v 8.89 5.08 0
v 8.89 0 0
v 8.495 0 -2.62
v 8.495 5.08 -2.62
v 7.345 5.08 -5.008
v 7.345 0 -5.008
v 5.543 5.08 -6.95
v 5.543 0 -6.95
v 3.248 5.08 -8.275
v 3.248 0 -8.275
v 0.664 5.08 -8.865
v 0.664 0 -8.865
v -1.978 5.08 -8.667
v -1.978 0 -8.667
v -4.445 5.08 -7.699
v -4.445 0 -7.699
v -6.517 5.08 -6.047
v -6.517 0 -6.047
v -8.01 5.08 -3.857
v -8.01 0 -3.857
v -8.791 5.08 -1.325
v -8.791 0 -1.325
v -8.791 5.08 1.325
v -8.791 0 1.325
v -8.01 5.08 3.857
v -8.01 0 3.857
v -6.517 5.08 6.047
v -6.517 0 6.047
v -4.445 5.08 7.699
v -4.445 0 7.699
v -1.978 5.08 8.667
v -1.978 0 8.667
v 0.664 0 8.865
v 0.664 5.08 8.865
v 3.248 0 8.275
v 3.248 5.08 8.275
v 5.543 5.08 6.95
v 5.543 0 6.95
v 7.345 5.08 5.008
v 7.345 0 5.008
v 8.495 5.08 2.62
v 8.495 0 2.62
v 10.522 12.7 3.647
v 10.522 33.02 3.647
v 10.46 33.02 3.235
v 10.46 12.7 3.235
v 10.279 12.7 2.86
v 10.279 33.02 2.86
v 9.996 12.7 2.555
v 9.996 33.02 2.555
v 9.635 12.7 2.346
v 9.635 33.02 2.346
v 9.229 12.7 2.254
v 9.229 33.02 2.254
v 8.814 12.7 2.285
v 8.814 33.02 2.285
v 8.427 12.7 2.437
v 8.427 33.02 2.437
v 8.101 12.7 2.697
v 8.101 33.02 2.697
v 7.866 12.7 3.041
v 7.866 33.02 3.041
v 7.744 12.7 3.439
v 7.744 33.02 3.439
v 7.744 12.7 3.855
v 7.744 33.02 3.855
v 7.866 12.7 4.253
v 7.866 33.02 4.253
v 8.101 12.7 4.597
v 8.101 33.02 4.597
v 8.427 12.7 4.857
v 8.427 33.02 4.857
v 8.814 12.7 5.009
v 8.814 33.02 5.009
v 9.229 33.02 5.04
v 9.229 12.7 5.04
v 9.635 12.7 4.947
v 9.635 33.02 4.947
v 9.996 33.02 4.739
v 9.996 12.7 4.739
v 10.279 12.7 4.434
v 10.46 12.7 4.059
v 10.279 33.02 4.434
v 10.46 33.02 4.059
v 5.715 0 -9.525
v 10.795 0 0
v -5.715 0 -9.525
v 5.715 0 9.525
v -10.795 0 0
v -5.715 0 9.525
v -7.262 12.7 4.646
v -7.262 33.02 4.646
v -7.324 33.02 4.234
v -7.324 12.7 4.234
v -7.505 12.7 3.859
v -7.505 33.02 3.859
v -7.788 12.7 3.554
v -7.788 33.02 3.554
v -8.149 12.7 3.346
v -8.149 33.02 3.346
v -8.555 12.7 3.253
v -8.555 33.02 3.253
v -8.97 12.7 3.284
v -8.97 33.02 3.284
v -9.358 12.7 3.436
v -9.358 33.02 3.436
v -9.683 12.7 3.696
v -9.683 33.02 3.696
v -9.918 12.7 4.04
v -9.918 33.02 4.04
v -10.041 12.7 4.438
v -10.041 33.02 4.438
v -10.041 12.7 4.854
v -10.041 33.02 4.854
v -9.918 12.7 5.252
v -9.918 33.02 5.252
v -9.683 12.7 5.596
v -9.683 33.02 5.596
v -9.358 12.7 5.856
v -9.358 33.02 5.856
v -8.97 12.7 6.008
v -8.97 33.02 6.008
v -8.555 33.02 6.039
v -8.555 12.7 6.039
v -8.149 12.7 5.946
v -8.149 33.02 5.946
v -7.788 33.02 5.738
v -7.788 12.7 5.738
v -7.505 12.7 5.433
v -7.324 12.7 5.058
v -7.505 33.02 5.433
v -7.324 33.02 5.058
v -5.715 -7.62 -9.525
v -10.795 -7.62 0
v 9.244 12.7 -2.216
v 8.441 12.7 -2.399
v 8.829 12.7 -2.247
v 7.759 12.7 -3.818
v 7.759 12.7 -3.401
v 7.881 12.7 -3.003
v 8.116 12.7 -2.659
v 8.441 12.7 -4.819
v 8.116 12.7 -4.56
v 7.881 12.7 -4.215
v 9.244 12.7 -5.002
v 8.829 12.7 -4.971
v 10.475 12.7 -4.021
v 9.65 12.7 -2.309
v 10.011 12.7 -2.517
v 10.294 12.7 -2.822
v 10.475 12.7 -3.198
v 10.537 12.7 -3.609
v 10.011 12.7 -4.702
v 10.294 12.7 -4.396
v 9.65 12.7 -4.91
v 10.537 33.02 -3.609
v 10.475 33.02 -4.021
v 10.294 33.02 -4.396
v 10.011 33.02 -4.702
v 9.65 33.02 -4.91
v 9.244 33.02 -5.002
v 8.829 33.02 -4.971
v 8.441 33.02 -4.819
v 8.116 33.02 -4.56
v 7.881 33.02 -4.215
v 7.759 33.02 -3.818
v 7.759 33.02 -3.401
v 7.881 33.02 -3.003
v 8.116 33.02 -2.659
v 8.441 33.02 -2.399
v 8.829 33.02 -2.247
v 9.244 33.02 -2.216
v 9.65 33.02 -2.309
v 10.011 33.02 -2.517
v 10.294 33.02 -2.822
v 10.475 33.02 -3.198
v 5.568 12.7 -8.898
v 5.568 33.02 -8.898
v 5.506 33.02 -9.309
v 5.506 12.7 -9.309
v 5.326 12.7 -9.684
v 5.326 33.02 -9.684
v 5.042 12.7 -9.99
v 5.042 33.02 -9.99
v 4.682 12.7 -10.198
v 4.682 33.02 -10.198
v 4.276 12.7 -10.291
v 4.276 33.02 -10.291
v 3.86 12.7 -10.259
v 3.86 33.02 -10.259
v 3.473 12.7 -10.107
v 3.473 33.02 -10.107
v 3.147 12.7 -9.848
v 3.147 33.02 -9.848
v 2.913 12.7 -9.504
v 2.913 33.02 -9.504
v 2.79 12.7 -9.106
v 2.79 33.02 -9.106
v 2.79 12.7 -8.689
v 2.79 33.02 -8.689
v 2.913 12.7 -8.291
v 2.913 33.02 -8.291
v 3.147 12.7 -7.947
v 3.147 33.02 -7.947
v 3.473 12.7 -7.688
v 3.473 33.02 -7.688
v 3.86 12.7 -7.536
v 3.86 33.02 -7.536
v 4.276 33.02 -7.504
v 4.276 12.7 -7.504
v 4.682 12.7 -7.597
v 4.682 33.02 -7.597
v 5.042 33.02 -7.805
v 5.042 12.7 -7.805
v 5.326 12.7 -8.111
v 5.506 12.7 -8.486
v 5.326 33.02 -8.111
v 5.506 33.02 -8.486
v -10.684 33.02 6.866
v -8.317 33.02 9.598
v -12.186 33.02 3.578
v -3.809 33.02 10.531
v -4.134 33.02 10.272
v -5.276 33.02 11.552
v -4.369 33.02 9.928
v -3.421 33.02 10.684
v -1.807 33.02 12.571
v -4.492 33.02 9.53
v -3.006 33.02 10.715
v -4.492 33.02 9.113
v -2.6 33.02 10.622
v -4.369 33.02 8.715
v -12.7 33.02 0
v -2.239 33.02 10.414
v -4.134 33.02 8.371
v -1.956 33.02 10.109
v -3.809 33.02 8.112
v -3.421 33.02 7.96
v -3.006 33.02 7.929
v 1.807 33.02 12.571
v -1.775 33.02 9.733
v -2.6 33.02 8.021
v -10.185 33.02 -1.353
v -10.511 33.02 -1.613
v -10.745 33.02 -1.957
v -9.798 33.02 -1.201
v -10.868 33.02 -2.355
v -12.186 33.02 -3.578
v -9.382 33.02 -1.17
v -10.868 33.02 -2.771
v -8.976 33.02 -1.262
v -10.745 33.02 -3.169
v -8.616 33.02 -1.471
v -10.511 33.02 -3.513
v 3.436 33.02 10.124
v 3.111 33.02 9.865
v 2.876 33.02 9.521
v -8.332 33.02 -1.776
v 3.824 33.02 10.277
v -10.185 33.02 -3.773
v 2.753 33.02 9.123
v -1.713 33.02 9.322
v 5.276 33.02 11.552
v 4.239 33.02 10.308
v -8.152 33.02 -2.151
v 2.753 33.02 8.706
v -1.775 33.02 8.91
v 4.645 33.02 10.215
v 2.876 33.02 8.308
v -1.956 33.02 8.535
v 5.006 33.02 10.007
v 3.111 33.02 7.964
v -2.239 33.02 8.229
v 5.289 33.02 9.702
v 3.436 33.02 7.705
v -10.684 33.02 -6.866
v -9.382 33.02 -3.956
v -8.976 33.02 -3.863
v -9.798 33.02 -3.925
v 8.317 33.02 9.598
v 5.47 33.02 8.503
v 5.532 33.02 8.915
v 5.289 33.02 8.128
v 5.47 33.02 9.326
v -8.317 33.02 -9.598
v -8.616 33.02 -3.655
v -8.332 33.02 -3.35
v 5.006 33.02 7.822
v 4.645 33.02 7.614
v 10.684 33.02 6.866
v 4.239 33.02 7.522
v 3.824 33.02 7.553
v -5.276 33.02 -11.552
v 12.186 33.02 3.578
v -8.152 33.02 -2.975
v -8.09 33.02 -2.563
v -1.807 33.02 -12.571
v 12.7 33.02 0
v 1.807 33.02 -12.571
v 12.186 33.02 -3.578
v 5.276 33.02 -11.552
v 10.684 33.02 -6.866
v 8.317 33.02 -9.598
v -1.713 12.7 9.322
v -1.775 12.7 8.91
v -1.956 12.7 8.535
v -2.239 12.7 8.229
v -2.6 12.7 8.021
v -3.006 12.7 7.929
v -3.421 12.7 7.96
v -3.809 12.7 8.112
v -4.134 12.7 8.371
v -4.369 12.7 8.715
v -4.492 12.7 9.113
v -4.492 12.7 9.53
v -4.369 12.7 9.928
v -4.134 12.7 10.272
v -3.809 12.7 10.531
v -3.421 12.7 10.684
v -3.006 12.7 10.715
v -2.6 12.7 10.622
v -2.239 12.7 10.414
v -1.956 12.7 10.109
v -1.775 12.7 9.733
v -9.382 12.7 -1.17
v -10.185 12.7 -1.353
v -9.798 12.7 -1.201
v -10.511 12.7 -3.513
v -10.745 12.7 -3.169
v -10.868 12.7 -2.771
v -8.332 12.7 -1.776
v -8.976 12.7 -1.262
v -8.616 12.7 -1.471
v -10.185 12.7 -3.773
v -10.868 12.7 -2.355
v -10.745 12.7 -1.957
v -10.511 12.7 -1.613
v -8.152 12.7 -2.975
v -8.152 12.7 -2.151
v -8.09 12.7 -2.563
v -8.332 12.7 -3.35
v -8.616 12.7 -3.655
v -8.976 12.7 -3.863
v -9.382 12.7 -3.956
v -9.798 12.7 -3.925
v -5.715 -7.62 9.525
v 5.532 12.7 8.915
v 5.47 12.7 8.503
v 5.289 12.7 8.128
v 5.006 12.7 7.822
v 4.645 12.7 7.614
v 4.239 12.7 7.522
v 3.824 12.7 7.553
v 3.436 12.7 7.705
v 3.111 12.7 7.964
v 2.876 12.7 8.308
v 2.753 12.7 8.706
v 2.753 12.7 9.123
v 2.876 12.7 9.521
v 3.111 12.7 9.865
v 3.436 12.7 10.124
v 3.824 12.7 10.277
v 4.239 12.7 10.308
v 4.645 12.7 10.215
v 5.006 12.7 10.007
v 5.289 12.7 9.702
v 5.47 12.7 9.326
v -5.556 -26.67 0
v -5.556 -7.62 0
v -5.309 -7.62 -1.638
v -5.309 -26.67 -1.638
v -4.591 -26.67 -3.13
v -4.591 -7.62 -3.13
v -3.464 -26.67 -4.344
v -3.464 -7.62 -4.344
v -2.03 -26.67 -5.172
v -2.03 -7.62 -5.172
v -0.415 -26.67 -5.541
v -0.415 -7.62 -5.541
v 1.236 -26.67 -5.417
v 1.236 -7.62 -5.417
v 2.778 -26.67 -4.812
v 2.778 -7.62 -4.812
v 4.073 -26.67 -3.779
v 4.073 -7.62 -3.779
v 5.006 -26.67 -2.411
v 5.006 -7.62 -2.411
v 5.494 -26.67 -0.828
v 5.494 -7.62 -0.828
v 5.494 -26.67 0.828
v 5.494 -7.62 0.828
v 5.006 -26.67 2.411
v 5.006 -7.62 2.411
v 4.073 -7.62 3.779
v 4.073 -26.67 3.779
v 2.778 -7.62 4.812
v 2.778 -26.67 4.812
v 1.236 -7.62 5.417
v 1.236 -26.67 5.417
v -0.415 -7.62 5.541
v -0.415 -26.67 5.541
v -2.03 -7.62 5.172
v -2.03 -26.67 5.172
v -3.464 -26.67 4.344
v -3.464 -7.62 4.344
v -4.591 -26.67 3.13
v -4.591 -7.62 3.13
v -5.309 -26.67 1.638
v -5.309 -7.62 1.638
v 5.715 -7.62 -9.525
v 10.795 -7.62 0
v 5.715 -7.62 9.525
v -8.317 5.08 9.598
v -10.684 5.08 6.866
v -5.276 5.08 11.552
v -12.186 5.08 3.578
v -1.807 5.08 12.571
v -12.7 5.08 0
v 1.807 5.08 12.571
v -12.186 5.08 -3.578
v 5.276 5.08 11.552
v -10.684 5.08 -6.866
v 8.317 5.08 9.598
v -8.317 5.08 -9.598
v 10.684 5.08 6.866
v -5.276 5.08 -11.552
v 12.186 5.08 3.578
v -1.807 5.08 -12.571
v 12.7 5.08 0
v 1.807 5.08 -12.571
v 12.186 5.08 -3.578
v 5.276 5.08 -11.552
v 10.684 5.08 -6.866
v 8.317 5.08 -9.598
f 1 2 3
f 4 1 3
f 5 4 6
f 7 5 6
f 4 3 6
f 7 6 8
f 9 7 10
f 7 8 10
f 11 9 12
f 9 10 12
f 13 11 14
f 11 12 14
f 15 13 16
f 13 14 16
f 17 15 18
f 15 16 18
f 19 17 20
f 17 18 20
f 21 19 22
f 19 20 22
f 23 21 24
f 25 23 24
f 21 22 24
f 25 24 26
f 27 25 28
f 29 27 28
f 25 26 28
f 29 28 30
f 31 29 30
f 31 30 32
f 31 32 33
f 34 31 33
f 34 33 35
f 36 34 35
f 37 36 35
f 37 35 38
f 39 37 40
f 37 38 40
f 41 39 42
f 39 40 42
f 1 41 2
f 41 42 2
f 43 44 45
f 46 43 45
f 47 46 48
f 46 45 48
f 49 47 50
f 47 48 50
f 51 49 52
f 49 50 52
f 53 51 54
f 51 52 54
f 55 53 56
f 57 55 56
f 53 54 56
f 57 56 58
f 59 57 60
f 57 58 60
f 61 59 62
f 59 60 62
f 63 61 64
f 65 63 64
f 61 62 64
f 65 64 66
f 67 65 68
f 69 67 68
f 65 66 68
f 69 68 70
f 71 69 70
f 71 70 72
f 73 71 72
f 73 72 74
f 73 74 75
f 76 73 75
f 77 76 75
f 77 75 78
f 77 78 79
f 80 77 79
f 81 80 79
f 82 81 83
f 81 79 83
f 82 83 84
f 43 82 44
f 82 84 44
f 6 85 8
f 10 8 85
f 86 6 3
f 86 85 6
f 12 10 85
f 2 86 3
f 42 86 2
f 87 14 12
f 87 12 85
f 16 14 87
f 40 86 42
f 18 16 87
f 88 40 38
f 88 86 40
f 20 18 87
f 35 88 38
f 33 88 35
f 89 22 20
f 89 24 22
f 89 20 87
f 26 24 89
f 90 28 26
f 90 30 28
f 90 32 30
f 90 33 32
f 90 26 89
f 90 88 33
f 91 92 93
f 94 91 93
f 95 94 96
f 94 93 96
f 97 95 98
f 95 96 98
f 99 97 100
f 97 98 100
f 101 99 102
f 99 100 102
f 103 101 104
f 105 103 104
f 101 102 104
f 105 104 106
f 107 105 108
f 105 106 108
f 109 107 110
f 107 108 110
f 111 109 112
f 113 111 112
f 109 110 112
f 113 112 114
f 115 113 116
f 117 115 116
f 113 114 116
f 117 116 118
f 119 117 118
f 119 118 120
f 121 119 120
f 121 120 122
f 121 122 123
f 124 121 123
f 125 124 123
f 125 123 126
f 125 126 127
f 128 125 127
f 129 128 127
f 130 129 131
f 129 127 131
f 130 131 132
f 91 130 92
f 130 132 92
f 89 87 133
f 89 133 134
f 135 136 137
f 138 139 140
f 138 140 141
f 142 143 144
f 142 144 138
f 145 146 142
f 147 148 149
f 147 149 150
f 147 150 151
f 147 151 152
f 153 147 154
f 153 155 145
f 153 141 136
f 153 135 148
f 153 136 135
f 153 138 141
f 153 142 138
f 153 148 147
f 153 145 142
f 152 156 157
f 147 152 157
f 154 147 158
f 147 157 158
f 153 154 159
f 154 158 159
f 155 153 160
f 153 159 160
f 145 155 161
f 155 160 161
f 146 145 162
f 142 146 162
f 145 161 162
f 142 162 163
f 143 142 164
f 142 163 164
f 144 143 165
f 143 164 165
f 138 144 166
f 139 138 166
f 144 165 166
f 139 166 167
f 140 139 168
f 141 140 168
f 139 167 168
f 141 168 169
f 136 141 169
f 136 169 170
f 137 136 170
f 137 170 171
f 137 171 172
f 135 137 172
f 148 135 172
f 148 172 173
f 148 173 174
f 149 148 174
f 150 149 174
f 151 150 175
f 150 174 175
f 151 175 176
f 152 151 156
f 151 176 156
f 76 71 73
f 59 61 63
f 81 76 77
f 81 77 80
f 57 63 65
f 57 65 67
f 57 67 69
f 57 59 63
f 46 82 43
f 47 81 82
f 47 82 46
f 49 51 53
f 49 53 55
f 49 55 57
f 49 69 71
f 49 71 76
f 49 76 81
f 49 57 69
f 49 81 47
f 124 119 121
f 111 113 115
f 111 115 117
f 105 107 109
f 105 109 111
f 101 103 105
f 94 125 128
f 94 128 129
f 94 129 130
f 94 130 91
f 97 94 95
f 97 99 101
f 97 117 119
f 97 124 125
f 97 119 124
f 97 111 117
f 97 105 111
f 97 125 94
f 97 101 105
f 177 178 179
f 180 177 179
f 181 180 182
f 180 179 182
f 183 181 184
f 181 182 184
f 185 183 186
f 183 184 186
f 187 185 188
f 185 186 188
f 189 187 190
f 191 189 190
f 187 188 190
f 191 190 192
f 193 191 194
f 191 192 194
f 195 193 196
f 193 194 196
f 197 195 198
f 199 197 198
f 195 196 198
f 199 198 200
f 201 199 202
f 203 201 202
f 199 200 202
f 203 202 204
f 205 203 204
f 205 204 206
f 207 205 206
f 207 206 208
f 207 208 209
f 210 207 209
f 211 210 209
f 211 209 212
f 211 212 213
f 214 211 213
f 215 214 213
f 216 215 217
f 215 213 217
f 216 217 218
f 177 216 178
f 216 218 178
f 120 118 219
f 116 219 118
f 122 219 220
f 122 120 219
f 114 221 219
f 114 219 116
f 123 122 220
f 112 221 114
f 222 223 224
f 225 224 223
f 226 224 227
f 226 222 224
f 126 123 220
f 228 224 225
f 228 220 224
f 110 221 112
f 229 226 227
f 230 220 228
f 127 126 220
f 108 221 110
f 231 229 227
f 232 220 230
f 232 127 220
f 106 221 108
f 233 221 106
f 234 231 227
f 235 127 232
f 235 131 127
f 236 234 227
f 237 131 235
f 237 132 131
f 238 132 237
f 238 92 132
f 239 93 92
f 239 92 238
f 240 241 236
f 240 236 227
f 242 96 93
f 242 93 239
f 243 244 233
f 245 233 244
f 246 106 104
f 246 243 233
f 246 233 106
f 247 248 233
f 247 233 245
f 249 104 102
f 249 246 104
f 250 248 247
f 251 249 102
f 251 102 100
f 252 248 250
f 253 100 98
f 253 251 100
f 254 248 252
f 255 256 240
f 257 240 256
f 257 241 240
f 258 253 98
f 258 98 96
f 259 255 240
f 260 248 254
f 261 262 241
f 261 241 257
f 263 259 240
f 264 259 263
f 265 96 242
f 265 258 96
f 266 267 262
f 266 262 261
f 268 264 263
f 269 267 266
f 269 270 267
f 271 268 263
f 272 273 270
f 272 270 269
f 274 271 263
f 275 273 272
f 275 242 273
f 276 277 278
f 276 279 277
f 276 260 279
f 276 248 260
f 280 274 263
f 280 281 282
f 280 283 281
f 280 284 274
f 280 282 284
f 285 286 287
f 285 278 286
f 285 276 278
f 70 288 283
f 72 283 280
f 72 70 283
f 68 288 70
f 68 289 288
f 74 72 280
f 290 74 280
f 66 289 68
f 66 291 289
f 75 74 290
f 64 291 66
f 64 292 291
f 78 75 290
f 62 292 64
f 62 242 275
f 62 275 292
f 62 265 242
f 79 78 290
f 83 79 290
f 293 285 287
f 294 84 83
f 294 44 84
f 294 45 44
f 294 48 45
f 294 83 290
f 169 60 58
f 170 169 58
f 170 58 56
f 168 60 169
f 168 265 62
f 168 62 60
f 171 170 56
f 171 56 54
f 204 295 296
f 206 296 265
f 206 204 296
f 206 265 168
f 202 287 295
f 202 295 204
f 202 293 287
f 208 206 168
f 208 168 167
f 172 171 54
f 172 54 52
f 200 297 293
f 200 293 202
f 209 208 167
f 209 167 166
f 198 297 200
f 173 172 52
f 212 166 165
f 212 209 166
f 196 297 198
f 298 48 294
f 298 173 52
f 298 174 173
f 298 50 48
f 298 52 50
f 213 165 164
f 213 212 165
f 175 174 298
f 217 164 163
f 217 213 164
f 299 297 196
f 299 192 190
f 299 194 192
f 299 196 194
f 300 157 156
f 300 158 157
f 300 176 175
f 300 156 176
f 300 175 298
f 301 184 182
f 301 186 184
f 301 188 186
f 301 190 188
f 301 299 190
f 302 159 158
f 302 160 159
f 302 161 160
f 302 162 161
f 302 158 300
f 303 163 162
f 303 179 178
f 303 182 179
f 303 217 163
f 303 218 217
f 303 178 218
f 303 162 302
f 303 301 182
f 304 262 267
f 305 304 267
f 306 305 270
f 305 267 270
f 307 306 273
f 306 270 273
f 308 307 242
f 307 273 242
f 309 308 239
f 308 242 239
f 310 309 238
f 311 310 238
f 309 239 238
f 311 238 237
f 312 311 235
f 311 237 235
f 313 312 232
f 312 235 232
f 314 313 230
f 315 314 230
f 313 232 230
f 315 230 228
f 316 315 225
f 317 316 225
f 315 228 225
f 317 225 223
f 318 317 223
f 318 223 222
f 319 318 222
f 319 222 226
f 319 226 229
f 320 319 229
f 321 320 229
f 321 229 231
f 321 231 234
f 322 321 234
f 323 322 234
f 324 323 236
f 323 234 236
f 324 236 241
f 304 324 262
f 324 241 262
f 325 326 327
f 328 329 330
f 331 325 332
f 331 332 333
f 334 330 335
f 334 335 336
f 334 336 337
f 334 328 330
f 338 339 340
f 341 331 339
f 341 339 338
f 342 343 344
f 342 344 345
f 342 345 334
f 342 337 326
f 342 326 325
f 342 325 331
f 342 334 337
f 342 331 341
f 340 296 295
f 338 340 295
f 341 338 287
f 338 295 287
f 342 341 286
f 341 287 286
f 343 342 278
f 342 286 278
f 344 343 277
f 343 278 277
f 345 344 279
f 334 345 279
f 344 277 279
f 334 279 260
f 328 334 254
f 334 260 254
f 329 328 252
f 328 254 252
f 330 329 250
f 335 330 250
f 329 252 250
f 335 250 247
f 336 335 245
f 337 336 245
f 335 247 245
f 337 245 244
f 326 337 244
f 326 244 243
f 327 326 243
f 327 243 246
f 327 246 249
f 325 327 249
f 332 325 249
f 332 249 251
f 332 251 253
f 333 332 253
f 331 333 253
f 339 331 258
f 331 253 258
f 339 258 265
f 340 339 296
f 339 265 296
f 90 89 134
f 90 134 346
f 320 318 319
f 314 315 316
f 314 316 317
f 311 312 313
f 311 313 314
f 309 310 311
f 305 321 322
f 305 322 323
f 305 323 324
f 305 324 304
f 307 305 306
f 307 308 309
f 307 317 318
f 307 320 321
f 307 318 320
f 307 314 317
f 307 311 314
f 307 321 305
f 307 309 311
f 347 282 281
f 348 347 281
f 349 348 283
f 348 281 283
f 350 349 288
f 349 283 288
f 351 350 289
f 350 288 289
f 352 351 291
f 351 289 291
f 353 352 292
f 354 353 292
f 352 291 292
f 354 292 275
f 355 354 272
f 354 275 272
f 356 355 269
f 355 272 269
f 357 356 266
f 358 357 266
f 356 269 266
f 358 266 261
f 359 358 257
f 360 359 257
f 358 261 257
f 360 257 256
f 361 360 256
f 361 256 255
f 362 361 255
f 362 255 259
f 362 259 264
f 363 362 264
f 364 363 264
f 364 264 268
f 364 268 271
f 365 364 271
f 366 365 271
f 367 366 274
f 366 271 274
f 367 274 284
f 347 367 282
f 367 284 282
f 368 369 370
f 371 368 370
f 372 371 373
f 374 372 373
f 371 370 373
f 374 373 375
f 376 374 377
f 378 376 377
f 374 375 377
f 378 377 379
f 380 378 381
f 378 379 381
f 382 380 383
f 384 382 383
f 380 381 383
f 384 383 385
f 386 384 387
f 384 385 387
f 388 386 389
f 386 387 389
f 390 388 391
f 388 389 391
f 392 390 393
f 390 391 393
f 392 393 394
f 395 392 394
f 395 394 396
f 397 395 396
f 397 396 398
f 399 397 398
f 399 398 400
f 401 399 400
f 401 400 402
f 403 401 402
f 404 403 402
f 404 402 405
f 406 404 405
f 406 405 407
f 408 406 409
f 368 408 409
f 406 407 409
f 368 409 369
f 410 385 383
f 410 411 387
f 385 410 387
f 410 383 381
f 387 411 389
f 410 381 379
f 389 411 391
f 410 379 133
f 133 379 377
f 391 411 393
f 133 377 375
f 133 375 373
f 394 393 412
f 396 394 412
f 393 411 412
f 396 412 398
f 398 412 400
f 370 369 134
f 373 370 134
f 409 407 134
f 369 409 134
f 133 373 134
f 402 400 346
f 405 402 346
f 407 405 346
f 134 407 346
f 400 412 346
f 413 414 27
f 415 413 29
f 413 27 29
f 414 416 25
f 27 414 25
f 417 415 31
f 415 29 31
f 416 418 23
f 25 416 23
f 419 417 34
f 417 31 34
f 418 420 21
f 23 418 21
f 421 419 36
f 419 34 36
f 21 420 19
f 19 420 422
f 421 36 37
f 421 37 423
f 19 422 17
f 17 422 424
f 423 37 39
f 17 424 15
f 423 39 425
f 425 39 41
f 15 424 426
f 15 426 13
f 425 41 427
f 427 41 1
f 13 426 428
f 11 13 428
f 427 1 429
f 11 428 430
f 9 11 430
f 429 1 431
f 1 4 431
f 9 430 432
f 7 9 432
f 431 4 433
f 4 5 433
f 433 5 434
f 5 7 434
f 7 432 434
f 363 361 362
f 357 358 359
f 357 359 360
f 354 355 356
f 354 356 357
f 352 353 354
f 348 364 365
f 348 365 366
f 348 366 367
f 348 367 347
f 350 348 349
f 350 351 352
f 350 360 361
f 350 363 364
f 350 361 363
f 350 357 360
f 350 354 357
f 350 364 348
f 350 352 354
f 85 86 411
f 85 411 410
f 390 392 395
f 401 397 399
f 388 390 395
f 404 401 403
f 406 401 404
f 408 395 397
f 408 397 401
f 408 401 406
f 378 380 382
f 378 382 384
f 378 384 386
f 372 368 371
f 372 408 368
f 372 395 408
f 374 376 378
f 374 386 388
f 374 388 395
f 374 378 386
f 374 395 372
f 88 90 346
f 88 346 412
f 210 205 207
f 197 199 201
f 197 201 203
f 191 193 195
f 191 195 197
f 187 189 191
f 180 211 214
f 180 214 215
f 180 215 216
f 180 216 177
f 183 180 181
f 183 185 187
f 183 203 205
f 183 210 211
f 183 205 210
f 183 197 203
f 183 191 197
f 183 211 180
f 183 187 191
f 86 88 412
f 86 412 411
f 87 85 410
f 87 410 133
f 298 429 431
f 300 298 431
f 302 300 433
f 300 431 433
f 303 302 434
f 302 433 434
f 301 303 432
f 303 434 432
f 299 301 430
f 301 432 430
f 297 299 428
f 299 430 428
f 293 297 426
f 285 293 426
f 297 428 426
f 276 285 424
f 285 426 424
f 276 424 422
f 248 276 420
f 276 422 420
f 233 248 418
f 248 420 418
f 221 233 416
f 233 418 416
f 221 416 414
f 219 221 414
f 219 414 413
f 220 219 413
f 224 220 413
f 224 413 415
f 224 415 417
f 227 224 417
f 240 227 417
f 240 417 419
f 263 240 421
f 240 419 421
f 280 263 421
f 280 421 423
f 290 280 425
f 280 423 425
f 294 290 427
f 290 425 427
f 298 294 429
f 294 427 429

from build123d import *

# Parameters (mm, degrees)
SKETCH1_R           = 8.89
BOSS_EXTRUDE1_DEPTH = 5.08
BOSS_EXTRUDE2_DEPTH = 7.62
SKETCH3_R           = 5.55625
BOSS_EXTRUDE3_DEPTH = 19.05
SKETCH4_R           = 12.7
BOSS_EXTRUDE4_DEPTH = 27.94
SKETCH5_R           = 1.397
CUT_EXTRUDE1_DEPTH  = 20.32


with BuildPart() as part:
    # Sketch1 → Boss-Extrude1 (new body)
    with BuildSketch(Plane(origin=(0, 0, 0), x_dir=(1, 0, 0), z_dir=(0, 1, 0))):
        Circle(SKETCH1_R)
    extrude(amount=BOSS_EXTRUDE1_DEPTH)

    # Sketch2 → Boss-Extrude2 (add)
    with BuildSketch(Plane.XZ):
        Polygon((-5.715, 9.525), (5.715, 9.525), (10.795, 0), (5.715, -9.525), (-5.715, -9.525), (-10.795, 0), align=None)
    extrude(amount=BOSS_EXTRUDE2_DEPTH)

    # Sketch3 → Boss-Extrude3 (add)
    with BuildSketch(Plane(origin=(0, -7.62, 0), x_dir=(-1, 0, 0), z_dir=(0, -1, 0))):
        Circle(SKETCH3_R)
    extrude(amount=BOSS_EXTRUDE3_DEPTH)

    # Sketch4 → Boss-Extrude4 (add)
    with BuildSketch(Plane(origin=(0, 5.08, 0), x_dir=(1, 0, 0), z_dir=(0, 1, 0))):
        Circle(SKETCH4_R)
    extrude(amount=BOSS_EXTRUDE4_DEPTH)

    # Sketch5 → Cut-Extrude1 (cut)
    with BuildSketch(Plane(origin=(0, 33.02, 0), x_dir=(1, 0, 0), z_dir=(0, 1, 0))):
        with Locations((4.171282729, 8.897519777)):
            Circle(SKETCH5_R)
        with Locations((9.139929654, 3.609313469)):
            Circle(SKETCH5_R)
        with Locations((9.125005102, -3.646880814)):
            Circle(SKETCH5_R)
        with Locations((4.134646728, -8.914603425)):
            Circle(SKETCH5_R)
        with Locations((-3.110139008, -9.321614299)):
            Circle(SKETCH5_R)
        with Locations((-8.659113, -4.645989651)):
            Circle(SKETCH5_R)
        with Locations((-9.486682104, 2.562873477)):
            Circle(SKETCH5_R)
    extrude(amount=-CUT_EXTRUDE1_DEPTH, mode=Mode.SUBTRACT)


solid = part.part
